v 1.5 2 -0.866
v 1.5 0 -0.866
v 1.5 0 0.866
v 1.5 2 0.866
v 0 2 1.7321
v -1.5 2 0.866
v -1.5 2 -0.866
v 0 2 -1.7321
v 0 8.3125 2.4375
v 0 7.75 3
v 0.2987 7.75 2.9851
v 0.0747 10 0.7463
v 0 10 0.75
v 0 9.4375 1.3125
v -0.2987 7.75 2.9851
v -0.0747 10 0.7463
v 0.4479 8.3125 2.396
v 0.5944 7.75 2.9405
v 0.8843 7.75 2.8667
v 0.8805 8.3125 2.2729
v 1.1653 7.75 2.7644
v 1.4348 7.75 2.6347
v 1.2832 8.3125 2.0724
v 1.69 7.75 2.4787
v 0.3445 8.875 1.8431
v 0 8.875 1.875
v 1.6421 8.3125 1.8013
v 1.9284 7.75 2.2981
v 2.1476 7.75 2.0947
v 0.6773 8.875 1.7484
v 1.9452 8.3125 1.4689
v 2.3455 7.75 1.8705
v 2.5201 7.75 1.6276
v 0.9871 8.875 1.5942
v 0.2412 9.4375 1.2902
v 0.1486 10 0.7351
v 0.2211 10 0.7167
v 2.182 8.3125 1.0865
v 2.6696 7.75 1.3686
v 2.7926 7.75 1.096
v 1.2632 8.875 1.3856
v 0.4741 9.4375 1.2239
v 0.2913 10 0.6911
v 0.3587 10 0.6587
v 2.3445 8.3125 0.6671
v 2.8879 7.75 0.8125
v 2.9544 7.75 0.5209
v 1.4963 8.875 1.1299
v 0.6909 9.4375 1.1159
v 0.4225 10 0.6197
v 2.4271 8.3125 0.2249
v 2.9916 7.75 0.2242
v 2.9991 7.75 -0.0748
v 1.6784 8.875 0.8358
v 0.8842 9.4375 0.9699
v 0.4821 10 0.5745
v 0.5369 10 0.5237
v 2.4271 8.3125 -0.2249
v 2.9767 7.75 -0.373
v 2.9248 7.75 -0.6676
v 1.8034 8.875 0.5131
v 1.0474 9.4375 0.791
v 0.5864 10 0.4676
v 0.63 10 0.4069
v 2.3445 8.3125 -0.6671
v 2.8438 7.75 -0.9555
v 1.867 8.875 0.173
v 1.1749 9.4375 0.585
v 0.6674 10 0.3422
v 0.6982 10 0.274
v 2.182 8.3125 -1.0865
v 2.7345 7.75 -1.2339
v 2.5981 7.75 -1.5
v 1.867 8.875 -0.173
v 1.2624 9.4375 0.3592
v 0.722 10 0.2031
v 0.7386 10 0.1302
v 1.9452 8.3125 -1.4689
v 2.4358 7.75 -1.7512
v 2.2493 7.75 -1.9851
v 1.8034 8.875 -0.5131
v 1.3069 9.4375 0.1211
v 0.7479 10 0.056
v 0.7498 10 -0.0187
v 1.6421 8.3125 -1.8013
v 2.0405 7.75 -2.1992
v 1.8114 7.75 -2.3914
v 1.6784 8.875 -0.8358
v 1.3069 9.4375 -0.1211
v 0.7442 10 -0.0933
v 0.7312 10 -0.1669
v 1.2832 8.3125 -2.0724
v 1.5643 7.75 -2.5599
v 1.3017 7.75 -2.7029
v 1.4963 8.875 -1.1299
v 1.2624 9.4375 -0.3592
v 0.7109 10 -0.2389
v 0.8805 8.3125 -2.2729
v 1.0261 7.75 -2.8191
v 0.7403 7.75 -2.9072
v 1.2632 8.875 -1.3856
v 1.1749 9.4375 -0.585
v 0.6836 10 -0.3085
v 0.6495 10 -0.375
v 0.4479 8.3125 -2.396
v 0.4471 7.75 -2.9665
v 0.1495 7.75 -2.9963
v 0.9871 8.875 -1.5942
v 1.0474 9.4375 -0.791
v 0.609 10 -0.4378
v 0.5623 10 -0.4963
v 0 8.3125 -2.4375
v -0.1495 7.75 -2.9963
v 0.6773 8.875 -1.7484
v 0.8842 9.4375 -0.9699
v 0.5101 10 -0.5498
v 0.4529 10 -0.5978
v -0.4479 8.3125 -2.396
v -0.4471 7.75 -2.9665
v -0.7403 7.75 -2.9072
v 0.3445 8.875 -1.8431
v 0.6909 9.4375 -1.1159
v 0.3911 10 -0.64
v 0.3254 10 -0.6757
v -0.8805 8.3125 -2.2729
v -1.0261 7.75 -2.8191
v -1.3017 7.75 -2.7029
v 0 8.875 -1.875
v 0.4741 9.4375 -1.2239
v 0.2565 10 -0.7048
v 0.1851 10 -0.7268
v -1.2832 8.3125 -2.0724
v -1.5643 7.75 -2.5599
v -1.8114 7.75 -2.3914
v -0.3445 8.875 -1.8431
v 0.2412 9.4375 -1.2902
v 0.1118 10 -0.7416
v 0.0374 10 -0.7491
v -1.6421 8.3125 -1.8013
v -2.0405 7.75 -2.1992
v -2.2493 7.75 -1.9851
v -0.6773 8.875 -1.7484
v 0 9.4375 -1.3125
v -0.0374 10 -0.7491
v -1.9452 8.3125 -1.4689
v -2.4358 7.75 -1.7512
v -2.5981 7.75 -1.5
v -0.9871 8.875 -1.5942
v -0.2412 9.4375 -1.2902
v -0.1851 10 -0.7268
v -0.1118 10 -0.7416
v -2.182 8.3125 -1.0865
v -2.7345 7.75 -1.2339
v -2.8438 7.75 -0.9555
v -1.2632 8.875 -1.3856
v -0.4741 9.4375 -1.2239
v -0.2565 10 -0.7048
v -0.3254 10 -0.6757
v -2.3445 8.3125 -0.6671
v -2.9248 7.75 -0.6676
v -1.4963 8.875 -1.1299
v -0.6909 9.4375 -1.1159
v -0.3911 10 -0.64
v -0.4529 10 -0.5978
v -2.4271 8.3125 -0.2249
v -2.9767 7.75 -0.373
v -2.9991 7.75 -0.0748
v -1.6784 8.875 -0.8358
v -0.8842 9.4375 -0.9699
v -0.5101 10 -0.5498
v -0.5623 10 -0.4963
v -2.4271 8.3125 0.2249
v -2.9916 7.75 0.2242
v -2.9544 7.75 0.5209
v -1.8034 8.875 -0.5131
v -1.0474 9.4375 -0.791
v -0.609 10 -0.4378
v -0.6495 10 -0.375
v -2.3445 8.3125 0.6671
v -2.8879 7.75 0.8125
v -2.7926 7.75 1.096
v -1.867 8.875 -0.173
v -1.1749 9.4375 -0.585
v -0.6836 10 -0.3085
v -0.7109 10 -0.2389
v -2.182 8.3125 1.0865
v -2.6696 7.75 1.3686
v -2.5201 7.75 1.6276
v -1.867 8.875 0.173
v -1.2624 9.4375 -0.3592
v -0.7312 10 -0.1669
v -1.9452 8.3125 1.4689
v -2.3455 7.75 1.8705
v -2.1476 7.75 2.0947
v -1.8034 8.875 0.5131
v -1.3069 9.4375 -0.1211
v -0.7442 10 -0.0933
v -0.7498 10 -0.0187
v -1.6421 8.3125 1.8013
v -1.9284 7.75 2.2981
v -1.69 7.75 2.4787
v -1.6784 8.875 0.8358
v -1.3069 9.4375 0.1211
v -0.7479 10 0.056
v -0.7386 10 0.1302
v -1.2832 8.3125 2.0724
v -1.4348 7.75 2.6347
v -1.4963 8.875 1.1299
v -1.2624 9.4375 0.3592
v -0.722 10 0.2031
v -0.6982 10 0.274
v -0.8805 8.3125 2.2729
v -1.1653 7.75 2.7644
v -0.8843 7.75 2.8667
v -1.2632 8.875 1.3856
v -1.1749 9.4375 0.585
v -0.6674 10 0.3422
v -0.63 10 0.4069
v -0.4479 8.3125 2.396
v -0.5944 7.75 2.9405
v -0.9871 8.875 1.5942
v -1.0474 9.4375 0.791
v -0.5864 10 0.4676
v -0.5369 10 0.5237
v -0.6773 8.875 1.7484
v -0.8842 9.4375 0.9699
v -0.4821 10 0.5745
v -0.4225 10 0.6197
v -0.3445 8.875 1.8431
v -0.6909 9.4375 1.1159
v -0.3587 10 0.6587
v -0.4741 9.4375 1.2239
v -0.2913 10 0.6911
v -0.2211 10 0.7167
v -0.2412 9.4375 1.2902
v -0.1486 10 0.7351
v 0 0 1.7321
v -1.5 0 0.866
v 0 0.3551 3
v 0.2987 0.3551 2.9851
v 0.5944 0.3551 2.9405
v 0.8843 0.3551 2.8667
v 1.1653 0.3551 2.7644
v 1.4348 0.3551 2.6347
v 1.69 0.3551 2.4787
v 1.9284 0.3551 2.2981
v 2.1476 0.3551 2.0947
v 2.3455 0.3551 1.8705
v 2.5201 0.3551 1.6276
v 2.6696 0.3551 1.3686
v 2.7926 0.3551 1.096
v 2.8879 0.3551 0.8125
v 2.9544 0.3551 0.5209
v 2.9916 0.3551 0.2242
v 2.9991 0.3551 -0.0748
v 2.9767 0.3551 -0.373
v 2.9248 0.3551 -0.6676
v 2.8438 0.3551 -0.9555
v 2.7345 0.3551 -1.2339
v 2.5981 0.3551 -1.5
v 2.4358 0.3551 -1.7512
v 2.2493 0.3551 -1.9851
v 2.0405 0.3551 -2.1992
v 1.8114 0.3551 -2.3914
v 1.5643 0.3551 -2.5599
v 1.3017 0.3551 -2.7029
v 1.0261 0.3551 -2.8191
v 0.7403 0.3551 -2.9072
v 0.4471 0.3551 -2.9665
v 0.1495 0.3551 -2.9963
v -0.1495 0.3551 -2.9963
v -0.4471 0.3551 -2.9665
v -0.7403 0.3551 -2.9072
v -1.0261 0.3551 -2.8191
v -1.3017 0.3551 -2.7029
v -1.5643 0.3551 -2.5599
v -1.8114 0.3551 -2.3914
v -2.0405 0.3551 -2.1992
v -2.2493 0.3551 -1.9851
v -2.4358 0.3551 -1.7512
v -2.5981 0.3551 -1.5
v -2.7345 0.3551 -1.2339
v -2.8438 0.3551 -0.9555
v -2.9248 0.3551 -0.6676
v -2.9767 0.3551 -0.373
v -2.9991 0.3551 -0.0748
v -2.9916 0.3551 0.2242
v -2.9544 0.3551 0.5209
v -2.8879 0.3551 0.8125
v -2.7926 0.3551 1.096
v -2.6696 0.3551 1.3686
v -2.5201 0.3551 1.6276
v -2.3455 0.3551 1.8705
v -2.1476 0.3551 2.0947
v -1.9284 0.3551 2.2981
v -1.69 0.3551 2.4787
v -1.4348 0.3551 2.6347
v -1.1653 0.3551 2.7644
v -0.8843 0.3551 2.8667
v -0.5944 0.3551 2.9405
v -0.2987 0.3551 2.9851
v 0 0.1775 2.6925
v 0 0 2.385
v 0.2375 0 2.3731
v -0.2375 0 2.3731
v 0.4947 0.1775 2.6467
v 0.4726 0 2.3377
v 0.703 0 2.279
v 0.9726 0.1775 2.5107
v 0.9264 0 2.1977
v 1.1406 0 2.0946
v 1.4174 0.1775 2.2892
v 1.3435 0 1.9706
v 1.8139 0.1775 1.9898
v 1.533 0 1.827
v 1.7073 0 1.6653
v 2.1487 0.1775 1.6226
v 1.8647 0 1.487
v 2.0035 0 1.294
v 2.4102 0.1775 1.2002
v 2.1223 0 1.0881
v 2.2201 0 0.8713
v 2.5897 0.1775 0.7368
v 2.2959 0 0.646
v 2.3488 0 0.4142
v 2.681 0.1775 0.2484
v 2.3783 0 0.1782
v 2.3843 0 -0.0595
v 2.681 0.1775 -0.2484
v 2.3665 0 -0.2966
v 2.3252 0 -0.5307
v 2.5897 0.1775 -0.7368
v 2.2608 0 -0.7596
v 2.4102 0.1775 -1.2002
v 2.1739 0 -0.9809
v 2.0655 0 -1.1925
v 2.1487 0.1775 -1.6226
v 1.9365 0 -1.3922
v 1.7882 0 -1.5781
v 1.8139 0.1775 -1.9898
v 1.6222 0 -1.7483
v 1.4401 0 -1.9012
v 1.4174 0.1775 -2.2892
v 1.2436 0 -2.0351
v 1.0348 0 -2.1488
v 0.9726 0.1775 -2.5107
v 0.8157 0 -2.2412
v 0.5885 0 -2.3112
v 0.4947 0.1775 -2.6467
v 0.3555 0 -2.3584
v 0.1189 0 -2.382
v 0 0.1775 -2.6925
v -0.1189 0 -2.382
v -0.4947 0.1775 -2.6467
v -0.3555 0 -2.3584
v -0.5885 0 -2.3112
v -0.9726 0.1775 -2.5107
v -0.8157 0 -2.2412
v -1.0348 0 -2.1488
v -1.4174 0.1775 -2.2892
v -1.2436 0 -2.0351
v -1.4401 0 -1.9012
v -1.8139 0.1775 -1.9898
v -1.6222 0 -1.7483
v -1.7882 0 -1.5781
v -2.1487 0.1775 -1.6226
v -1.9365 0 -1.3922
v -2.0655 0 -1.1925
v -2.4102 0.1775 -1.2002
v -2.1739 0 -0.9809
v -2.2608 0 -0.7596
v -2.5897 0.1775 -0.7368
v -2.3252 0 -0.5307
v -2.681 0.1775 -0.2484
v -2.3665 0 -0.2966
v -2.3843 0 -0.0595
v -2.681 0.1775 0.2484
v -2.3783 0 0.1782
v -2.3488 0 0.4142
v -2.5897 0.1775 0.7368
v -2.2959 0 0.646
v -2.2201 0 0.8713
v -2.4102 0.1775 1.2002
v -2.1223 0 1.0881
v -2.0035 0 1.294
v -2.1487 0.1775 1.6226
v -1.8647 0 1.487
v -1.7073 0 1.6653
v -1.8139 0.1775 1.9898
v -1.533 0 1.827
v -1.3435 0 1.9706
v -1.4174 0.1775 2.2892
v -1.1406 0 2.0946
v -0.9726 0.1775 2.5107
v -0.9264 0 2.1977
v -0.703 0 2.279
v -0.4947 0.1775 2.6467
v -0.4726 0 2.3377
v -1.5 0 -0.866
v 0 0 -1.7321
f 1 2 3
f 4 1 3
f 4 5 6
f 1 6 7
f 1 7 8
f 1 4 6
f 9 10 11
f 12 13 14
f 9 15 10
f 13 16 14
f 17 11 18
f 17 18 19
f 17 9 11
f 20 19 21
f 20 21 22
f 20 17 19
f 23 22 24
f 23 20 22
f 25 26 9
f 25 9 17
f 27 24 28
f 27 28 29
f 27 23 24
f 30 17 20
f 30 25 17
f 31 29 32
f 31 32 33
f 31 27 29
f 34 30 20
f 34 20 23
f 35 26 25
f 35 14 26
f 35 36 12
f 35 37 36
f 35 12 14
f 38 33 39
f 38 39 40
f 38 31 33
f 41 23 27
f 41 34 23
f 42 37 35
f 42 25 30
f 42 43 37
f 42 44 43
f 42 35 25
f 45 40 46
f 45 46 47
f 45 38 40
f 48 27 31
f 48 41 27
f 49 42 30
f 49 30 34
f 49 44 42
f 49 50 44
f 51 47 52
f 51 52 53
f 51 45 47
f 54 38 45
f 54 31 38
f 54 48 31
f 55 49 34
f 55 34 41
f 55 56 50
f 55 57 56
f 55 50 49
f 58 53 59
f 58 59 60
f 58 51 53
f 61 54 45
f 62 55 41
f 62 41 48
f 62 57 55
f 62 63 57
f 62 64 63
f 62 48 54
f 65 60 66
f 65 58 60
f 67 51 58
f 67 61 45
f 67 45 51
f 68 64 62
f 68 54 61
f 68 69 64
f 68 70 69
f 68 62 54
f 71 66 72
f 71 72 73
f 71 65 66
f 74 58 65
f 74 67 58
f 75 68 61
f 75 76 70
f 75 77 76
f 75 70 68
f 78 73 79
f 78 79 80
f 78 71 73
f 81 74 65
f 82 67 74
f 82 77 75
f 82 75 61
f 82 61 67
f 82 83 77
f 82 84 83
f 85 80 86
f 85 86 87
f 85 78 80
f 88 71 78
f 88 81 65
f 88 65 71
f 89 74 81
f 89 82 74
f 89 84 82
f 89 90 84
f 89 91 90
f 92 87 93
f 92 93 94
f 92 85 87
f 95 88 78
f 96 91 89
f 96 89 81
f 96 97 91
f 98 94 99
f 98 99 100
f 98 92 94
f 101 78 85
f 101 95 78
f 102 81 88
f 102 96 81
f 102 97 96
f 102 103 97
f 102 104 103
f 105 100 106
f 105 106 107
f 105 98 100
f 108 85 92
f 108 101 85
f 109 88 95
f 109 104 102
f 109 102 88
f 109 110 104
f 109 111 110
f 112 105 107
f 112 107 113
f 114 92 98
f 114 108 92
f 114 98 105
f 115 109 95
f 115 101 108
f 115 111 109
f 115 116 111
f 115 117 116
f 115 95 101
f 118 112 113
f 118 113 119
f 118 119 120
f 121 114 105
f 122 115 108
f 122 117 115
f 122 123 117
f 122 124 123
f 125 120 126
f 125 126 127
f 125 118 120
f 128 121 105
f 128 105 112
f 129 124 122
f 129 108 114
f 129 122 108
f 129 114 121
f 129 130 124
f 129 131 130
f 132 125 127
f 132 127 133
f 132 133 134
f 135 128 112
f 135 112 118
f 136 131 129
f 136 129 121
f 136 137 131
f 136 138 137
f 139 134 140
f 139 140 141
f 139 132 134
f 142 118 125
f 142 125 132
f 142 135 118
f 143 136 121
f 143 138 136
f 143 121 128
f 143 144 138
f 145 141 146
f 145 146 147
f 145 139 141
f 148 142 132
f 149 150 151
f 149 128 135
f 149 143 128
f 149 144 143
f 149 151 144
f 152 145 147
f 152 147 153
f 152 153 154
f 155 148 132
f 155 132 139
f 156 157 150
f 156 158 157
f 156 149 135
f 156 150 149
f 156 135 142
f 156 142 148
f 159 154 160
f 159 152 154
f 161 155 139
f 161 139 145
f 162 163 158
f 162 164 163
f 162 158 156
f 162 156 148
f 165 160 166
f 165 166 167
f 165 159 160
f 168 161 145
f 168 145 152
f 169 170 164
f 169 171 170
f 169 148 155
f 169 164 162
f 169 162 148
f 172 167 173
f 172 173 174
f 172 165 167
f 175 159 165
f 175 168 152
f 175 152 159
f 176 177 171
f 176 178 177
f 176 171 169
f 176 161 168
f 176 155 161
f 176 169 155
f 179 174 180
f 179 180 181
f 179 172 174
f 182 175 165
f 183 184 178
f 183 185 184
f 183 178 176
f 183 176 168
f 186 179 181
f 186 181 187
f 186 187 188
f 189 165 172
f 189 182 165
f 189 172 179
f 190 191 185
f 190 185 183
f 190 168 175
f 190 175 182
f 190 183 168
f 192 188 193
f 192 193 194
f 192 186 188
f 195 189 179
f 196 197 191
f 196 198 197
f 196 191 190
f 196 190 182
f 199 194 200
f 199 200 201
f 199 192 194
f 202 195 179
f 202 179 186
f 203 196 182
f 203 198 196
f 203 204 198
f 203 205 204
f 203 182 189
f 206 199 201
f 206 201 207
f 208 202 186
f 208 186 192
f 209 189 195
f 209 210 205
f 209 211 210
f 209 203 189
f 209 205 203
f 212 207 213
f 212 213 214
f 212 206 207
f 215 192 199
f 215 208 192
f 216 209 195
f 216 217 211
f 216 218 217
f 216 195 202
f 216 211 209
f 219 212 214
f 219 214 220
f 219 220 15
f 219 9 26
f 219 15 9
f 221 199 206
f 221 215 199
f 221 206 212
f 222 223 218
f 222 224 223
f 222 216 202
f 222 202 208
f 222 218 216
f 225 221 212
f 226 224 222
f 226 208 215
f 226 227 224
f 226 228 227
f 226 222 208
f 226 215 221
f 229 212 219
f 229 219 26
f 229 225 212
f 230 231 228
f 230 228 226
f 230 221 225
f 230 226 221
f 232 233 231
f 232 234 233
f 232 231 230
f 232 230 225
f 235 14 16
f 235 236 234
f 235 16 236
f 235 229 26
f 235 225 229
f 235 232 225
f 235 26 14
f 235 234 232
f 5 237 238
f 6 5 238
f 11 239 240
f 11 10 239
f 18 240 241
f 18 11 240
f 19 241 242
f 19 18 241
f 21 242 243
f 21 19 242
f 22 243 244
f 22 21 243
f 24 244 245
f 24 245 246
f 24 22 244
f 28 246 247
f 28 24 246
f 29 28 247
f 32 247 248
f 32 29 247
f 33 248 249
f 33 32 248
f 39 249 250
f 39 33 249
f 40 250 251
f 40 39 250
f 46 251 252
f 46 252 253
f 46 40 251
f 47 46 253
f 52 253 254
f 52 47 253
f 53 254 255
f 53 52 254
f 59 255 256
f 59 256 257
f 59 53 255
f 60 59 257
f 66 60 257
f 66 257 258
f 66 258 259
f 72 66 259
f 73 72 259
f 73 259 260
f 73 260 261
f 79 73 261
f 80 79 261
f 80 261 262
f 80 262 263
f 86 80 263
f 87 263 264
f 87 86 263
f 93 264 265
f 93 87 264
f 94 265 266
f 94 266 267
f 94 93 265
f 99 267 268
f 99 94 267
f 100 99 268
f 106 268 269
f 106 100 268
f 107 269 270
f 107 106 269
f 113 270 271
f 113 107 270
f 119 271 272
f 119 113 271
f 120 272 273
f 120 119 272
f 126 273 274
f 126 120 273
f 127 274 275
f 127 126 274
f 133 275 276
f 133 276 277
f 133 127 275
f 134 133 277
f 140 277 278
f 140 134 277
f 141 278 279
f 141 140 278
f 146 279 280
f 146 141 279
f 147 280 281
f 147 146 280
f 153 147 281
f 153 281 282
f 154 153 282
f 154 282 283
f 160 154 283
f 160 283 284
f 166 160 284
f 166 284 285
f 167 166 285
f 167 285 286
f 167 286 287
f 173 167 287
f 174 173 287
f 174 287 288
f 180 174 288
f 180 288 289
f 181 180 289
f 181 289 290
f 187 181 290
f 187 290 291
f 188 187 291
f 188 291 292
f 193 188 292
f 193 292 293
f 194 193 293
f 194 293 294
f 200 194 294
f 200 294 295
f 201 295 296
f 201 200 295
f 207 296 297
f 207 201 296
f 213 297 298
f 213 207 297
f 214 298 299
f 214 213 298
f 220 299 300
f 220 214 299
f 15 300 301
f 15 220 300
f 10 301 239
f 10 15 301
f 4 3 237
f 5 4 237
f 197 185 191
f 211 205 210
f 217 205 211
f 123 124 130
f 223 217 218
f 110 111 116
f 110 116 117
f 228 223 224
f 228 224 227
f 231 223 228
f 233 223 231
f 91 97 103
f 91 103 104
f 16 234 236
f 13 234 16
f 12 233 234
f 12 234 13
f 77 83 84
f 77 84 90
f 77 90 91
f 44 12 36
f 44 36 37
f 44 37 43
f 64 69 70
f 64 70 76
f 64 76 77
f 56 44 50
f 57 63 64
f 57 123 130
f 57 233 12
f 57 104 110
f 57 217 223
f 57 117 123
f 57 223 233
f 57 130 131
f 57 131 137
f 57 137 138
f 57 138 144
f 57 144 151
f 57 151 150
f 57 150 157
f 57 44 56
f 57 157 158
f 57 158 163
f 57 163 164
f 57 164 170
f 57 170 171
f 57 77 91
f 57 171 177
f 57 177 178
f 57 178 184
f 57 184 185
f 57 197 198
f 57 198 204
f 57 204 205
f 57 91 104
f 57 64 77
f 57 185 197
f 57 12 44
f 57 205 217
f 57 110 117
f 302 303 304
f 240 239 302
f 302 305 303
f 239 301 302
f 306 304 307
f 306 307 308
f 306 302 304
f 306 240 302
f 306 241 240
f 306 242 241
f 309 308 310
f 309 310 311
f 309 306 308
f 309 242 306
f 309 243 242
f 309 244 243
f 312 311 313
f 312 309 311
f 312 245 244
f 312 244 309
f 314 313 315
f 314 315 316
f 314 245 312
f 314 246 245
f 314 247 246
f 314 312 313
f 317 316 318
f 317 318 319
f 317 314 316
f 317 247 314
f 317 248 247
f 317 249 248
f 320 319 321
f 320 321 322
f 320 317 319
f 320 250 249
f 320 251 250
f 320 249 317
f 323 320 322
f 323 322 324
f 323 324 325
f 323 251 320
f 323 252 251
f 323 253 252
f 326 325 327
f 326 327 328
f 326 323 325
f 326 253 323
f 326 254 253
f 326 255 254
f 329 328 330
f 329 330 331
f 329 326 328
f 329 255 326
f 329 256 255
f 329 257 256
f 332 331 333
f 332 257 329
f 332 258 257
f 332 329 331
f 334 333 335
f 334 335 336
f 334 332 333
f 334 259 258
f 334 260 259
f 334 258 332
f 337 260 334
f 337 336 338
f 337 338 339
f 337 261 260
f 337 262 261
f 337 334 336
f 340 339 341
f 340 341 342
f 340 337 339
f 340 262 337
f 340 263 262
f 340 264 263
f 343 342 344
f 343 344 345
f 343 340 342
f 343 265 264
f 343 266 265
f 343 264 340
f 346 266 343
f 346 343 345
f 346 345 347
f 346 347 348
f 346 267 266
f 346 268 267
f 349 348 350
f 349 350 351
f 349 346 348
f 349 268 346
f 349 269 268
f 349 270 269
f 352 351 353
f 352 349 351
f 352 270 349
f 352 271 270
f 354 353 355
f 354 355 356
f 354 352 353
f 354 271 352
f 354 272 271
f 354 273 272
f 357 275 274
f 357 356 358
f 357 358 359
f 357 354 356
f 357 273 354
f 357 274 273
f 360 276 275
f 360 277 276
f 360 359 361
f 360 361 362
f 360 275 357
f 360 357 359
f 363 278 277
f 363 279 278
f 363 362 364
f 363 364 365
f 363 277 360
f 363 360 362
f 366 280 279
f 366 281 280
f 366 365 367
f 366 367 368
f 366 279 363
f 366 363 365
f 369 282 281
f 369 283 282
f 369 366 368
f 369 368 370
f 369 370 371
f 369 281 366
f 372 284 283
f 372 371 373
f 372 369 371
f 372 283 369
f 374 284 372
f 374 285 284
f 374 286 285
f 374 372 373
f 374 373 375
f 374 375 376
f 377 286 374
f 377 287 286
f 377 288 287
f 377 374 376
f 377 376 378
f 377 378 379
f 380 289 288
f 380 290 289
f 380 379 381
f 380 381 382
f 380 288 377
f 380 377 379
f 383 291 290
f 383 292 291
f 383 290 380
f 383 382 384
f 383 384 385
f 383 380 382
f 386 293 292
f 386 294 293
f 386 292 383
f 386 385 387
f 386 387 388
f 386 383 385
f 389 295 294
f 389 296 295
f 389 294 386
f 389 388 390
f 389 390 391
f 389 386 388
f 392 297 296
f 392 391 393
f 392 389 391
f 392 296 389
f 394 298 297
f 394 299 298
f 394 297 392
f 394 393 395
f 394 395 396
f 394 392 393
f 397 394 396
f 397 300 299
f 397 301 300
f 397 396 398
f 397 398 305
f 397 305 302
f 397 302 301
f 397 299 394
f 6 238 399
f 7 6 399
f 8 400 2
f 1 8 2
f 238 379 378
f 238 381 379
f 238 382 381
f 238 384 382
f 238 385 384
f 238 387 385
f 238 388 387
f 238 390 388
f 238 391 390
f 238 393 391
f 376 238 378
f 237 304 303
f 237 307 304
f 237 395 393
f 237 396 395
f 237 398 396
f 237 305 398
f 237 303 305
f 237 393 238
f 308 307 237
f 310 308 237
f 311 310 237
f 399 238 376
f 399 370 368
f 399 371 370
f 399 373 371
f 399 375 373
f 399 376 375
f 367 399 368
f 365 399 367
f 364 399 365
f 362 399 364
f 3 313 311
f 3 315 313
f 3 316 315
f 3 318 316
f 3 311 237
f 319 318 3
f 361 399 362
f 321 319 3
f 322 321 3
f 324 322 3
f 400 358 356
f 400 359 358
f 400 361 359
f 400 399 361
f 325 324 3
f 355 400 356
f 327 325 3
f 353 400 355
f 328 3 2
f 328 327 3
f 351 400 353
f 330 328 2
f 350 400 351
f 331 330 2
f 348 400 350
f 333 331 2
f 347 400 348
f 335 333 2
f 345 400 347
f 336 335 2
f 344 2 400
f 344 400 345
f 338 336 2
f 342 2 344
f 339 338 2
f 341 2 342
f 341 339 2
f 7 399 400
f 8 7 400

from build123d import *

# Parameters (mm, degrees)
POCKET_DEPTH = 2


with BuildPart() as part:
    # Sketch → Revolution (revolve)
    with BuildSketch(Plane.YZ):
        Polygon((0, 0), (0, 2.385), (0.35507, 3), (7.75, 3), (10, 0.75), (10, 0), align=None)
    revolve(axis=Axis((0, 0, 0), (0, 1, 0)))

    # Sketch001 → Pocket (cut)
    with BuildSketch(Plane(origin=(0, 0, 0), x_dir=(0, 0, -1), z_dir=(0, -1, 0))):
        Polygon((-0.866025, -1.5), (0.866025, -1.5), (1.732051, 0), (0.866025, 1.5), (-0.866025, 1.5), (-1.732051, 0), align=None)
    extrude(amount=-POCKET_DEPTH, mode=Mode.SUBTRACT)


solid = part.part
